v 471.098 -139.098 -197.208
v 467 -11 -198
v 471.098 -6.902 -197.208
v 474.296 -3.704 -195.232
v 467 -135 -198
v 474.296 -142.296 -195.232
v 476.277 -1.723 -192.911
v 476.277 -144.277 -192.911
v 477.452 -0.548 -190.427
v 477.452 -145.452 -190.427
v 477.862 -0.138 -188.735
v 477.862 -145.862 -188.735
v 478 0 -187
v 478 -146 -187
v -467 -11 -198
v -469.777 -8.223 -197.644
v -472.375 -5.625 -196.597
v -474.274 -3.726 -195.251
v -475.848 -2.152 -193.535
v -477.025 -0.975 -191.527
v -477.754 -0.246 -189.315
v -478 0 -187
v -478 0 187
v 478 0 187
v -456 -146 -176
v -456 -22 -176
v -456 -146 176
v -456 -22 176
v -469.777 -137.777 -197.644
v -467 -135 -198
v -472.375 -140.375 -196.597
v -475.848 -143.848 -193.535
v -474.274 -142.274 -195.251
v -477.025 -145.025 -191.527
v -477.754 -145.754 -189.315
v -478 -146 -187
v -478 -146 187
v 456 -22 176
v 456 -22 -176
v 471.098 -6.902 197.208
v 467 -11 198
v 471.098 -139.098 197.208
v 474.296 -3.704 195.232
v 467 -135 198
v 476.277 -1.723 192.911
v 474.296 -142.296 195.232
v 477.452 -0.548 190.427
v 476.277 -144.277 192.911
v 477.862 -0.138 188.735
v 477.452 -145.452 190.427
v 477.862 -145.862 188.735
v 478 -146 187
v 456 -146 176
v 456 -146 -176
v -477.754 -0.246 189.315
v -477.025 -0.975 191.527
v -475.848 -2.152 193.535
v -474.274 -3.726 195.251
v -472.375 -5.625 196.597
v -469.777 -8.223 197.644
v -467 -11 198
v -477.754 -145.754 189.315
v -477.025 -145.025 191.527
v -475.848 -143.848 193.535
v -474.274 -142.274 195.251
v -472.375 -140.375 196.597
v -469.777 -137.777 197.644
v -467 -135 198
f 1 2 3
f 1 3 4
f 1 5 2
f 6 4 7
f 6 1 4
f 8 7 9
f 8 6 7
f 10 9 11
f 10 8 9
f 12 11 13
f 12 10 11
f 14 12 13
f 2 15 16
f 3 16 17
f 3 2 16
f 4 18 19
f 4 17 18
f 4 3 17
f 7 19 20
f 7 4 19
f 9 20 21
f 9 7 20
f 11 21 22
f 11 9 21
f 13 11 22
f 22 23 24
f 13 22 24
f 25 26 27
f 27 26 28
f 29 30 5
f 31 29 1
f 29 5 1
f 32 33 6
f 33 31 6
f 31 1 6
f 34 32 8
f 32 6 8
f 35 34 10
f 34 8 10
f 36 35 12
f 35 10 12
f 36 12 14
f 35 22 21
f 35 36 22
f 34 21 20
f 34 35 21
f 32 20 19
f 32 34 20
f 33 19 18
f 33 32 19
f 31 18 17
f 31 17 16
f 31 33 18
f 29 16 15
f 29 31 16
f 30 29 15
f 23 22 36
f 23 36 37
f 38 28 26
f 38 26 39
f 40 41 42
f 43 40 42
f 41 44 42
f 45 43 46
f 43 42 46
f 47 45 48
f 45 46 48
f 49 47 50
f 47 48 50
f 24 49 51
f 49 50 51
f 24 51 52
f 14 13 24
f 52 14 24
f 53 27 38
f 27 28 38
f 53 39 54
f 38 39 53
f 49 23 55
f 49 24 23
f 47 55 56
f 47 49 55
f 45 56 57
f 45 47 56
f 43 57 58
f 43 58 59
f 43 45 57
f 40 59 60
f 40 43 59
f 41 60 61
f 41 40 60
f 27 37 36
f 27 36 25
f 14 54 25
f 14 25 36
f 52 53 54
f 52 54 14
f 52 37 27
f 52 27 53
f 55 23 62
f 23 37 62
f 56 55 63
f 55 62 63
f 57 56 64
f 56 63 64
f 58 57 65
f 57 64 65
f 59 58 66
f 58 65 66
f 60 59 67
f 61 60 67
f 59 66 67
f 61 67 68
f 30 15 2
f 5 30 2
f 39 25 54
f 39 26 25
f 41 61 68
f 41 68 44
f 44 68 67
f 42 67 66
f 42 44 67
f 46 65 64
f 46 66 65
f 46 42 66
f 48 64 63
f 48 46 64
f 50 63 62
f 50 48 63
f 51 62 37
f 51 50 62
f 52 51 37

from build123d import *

# Parameters (mm, degrees)
F0_W     = 956
F0_H     = 396
F1_DEPTH = 146
F2_T     = -22
F3_R     = 11
F4_R     = 11


with BuildPart() as f1:
    # F0 (on Front) → F1 (new body)
    with BuildSketch(Plane.XZ):
        Rectangle(F0_W, F0_H)
    extrude(amount=F1_DEPTH)

    # F2
    f2_openings = [f1.faces().sort_by_distance(p)[0] for p in [
        (0, -146, 0),
    ]]
    offset(amount=F2_T, openings=f2_openings)

    # F3
    f3_edges = [f1.edges().sort_by_distance(p)[0] for p in [
        (-478, -73, -198),
        (478, -73, -198),
        (0, 0, -198),
        (0, -146, -198),
    ]]
    fillet(f3_edges, radius=F3_R)

    # F4
    f4_edges = [f1.edges().sort_by_distance(p)[0] for p in [
        (478, -73, 198),
        (-478, -73, 198),
        (0, 0, 198),
        (0, -146, 198),
    ]]
    fillet(f4_edges, radius=F4_R)


solid = f1.part
